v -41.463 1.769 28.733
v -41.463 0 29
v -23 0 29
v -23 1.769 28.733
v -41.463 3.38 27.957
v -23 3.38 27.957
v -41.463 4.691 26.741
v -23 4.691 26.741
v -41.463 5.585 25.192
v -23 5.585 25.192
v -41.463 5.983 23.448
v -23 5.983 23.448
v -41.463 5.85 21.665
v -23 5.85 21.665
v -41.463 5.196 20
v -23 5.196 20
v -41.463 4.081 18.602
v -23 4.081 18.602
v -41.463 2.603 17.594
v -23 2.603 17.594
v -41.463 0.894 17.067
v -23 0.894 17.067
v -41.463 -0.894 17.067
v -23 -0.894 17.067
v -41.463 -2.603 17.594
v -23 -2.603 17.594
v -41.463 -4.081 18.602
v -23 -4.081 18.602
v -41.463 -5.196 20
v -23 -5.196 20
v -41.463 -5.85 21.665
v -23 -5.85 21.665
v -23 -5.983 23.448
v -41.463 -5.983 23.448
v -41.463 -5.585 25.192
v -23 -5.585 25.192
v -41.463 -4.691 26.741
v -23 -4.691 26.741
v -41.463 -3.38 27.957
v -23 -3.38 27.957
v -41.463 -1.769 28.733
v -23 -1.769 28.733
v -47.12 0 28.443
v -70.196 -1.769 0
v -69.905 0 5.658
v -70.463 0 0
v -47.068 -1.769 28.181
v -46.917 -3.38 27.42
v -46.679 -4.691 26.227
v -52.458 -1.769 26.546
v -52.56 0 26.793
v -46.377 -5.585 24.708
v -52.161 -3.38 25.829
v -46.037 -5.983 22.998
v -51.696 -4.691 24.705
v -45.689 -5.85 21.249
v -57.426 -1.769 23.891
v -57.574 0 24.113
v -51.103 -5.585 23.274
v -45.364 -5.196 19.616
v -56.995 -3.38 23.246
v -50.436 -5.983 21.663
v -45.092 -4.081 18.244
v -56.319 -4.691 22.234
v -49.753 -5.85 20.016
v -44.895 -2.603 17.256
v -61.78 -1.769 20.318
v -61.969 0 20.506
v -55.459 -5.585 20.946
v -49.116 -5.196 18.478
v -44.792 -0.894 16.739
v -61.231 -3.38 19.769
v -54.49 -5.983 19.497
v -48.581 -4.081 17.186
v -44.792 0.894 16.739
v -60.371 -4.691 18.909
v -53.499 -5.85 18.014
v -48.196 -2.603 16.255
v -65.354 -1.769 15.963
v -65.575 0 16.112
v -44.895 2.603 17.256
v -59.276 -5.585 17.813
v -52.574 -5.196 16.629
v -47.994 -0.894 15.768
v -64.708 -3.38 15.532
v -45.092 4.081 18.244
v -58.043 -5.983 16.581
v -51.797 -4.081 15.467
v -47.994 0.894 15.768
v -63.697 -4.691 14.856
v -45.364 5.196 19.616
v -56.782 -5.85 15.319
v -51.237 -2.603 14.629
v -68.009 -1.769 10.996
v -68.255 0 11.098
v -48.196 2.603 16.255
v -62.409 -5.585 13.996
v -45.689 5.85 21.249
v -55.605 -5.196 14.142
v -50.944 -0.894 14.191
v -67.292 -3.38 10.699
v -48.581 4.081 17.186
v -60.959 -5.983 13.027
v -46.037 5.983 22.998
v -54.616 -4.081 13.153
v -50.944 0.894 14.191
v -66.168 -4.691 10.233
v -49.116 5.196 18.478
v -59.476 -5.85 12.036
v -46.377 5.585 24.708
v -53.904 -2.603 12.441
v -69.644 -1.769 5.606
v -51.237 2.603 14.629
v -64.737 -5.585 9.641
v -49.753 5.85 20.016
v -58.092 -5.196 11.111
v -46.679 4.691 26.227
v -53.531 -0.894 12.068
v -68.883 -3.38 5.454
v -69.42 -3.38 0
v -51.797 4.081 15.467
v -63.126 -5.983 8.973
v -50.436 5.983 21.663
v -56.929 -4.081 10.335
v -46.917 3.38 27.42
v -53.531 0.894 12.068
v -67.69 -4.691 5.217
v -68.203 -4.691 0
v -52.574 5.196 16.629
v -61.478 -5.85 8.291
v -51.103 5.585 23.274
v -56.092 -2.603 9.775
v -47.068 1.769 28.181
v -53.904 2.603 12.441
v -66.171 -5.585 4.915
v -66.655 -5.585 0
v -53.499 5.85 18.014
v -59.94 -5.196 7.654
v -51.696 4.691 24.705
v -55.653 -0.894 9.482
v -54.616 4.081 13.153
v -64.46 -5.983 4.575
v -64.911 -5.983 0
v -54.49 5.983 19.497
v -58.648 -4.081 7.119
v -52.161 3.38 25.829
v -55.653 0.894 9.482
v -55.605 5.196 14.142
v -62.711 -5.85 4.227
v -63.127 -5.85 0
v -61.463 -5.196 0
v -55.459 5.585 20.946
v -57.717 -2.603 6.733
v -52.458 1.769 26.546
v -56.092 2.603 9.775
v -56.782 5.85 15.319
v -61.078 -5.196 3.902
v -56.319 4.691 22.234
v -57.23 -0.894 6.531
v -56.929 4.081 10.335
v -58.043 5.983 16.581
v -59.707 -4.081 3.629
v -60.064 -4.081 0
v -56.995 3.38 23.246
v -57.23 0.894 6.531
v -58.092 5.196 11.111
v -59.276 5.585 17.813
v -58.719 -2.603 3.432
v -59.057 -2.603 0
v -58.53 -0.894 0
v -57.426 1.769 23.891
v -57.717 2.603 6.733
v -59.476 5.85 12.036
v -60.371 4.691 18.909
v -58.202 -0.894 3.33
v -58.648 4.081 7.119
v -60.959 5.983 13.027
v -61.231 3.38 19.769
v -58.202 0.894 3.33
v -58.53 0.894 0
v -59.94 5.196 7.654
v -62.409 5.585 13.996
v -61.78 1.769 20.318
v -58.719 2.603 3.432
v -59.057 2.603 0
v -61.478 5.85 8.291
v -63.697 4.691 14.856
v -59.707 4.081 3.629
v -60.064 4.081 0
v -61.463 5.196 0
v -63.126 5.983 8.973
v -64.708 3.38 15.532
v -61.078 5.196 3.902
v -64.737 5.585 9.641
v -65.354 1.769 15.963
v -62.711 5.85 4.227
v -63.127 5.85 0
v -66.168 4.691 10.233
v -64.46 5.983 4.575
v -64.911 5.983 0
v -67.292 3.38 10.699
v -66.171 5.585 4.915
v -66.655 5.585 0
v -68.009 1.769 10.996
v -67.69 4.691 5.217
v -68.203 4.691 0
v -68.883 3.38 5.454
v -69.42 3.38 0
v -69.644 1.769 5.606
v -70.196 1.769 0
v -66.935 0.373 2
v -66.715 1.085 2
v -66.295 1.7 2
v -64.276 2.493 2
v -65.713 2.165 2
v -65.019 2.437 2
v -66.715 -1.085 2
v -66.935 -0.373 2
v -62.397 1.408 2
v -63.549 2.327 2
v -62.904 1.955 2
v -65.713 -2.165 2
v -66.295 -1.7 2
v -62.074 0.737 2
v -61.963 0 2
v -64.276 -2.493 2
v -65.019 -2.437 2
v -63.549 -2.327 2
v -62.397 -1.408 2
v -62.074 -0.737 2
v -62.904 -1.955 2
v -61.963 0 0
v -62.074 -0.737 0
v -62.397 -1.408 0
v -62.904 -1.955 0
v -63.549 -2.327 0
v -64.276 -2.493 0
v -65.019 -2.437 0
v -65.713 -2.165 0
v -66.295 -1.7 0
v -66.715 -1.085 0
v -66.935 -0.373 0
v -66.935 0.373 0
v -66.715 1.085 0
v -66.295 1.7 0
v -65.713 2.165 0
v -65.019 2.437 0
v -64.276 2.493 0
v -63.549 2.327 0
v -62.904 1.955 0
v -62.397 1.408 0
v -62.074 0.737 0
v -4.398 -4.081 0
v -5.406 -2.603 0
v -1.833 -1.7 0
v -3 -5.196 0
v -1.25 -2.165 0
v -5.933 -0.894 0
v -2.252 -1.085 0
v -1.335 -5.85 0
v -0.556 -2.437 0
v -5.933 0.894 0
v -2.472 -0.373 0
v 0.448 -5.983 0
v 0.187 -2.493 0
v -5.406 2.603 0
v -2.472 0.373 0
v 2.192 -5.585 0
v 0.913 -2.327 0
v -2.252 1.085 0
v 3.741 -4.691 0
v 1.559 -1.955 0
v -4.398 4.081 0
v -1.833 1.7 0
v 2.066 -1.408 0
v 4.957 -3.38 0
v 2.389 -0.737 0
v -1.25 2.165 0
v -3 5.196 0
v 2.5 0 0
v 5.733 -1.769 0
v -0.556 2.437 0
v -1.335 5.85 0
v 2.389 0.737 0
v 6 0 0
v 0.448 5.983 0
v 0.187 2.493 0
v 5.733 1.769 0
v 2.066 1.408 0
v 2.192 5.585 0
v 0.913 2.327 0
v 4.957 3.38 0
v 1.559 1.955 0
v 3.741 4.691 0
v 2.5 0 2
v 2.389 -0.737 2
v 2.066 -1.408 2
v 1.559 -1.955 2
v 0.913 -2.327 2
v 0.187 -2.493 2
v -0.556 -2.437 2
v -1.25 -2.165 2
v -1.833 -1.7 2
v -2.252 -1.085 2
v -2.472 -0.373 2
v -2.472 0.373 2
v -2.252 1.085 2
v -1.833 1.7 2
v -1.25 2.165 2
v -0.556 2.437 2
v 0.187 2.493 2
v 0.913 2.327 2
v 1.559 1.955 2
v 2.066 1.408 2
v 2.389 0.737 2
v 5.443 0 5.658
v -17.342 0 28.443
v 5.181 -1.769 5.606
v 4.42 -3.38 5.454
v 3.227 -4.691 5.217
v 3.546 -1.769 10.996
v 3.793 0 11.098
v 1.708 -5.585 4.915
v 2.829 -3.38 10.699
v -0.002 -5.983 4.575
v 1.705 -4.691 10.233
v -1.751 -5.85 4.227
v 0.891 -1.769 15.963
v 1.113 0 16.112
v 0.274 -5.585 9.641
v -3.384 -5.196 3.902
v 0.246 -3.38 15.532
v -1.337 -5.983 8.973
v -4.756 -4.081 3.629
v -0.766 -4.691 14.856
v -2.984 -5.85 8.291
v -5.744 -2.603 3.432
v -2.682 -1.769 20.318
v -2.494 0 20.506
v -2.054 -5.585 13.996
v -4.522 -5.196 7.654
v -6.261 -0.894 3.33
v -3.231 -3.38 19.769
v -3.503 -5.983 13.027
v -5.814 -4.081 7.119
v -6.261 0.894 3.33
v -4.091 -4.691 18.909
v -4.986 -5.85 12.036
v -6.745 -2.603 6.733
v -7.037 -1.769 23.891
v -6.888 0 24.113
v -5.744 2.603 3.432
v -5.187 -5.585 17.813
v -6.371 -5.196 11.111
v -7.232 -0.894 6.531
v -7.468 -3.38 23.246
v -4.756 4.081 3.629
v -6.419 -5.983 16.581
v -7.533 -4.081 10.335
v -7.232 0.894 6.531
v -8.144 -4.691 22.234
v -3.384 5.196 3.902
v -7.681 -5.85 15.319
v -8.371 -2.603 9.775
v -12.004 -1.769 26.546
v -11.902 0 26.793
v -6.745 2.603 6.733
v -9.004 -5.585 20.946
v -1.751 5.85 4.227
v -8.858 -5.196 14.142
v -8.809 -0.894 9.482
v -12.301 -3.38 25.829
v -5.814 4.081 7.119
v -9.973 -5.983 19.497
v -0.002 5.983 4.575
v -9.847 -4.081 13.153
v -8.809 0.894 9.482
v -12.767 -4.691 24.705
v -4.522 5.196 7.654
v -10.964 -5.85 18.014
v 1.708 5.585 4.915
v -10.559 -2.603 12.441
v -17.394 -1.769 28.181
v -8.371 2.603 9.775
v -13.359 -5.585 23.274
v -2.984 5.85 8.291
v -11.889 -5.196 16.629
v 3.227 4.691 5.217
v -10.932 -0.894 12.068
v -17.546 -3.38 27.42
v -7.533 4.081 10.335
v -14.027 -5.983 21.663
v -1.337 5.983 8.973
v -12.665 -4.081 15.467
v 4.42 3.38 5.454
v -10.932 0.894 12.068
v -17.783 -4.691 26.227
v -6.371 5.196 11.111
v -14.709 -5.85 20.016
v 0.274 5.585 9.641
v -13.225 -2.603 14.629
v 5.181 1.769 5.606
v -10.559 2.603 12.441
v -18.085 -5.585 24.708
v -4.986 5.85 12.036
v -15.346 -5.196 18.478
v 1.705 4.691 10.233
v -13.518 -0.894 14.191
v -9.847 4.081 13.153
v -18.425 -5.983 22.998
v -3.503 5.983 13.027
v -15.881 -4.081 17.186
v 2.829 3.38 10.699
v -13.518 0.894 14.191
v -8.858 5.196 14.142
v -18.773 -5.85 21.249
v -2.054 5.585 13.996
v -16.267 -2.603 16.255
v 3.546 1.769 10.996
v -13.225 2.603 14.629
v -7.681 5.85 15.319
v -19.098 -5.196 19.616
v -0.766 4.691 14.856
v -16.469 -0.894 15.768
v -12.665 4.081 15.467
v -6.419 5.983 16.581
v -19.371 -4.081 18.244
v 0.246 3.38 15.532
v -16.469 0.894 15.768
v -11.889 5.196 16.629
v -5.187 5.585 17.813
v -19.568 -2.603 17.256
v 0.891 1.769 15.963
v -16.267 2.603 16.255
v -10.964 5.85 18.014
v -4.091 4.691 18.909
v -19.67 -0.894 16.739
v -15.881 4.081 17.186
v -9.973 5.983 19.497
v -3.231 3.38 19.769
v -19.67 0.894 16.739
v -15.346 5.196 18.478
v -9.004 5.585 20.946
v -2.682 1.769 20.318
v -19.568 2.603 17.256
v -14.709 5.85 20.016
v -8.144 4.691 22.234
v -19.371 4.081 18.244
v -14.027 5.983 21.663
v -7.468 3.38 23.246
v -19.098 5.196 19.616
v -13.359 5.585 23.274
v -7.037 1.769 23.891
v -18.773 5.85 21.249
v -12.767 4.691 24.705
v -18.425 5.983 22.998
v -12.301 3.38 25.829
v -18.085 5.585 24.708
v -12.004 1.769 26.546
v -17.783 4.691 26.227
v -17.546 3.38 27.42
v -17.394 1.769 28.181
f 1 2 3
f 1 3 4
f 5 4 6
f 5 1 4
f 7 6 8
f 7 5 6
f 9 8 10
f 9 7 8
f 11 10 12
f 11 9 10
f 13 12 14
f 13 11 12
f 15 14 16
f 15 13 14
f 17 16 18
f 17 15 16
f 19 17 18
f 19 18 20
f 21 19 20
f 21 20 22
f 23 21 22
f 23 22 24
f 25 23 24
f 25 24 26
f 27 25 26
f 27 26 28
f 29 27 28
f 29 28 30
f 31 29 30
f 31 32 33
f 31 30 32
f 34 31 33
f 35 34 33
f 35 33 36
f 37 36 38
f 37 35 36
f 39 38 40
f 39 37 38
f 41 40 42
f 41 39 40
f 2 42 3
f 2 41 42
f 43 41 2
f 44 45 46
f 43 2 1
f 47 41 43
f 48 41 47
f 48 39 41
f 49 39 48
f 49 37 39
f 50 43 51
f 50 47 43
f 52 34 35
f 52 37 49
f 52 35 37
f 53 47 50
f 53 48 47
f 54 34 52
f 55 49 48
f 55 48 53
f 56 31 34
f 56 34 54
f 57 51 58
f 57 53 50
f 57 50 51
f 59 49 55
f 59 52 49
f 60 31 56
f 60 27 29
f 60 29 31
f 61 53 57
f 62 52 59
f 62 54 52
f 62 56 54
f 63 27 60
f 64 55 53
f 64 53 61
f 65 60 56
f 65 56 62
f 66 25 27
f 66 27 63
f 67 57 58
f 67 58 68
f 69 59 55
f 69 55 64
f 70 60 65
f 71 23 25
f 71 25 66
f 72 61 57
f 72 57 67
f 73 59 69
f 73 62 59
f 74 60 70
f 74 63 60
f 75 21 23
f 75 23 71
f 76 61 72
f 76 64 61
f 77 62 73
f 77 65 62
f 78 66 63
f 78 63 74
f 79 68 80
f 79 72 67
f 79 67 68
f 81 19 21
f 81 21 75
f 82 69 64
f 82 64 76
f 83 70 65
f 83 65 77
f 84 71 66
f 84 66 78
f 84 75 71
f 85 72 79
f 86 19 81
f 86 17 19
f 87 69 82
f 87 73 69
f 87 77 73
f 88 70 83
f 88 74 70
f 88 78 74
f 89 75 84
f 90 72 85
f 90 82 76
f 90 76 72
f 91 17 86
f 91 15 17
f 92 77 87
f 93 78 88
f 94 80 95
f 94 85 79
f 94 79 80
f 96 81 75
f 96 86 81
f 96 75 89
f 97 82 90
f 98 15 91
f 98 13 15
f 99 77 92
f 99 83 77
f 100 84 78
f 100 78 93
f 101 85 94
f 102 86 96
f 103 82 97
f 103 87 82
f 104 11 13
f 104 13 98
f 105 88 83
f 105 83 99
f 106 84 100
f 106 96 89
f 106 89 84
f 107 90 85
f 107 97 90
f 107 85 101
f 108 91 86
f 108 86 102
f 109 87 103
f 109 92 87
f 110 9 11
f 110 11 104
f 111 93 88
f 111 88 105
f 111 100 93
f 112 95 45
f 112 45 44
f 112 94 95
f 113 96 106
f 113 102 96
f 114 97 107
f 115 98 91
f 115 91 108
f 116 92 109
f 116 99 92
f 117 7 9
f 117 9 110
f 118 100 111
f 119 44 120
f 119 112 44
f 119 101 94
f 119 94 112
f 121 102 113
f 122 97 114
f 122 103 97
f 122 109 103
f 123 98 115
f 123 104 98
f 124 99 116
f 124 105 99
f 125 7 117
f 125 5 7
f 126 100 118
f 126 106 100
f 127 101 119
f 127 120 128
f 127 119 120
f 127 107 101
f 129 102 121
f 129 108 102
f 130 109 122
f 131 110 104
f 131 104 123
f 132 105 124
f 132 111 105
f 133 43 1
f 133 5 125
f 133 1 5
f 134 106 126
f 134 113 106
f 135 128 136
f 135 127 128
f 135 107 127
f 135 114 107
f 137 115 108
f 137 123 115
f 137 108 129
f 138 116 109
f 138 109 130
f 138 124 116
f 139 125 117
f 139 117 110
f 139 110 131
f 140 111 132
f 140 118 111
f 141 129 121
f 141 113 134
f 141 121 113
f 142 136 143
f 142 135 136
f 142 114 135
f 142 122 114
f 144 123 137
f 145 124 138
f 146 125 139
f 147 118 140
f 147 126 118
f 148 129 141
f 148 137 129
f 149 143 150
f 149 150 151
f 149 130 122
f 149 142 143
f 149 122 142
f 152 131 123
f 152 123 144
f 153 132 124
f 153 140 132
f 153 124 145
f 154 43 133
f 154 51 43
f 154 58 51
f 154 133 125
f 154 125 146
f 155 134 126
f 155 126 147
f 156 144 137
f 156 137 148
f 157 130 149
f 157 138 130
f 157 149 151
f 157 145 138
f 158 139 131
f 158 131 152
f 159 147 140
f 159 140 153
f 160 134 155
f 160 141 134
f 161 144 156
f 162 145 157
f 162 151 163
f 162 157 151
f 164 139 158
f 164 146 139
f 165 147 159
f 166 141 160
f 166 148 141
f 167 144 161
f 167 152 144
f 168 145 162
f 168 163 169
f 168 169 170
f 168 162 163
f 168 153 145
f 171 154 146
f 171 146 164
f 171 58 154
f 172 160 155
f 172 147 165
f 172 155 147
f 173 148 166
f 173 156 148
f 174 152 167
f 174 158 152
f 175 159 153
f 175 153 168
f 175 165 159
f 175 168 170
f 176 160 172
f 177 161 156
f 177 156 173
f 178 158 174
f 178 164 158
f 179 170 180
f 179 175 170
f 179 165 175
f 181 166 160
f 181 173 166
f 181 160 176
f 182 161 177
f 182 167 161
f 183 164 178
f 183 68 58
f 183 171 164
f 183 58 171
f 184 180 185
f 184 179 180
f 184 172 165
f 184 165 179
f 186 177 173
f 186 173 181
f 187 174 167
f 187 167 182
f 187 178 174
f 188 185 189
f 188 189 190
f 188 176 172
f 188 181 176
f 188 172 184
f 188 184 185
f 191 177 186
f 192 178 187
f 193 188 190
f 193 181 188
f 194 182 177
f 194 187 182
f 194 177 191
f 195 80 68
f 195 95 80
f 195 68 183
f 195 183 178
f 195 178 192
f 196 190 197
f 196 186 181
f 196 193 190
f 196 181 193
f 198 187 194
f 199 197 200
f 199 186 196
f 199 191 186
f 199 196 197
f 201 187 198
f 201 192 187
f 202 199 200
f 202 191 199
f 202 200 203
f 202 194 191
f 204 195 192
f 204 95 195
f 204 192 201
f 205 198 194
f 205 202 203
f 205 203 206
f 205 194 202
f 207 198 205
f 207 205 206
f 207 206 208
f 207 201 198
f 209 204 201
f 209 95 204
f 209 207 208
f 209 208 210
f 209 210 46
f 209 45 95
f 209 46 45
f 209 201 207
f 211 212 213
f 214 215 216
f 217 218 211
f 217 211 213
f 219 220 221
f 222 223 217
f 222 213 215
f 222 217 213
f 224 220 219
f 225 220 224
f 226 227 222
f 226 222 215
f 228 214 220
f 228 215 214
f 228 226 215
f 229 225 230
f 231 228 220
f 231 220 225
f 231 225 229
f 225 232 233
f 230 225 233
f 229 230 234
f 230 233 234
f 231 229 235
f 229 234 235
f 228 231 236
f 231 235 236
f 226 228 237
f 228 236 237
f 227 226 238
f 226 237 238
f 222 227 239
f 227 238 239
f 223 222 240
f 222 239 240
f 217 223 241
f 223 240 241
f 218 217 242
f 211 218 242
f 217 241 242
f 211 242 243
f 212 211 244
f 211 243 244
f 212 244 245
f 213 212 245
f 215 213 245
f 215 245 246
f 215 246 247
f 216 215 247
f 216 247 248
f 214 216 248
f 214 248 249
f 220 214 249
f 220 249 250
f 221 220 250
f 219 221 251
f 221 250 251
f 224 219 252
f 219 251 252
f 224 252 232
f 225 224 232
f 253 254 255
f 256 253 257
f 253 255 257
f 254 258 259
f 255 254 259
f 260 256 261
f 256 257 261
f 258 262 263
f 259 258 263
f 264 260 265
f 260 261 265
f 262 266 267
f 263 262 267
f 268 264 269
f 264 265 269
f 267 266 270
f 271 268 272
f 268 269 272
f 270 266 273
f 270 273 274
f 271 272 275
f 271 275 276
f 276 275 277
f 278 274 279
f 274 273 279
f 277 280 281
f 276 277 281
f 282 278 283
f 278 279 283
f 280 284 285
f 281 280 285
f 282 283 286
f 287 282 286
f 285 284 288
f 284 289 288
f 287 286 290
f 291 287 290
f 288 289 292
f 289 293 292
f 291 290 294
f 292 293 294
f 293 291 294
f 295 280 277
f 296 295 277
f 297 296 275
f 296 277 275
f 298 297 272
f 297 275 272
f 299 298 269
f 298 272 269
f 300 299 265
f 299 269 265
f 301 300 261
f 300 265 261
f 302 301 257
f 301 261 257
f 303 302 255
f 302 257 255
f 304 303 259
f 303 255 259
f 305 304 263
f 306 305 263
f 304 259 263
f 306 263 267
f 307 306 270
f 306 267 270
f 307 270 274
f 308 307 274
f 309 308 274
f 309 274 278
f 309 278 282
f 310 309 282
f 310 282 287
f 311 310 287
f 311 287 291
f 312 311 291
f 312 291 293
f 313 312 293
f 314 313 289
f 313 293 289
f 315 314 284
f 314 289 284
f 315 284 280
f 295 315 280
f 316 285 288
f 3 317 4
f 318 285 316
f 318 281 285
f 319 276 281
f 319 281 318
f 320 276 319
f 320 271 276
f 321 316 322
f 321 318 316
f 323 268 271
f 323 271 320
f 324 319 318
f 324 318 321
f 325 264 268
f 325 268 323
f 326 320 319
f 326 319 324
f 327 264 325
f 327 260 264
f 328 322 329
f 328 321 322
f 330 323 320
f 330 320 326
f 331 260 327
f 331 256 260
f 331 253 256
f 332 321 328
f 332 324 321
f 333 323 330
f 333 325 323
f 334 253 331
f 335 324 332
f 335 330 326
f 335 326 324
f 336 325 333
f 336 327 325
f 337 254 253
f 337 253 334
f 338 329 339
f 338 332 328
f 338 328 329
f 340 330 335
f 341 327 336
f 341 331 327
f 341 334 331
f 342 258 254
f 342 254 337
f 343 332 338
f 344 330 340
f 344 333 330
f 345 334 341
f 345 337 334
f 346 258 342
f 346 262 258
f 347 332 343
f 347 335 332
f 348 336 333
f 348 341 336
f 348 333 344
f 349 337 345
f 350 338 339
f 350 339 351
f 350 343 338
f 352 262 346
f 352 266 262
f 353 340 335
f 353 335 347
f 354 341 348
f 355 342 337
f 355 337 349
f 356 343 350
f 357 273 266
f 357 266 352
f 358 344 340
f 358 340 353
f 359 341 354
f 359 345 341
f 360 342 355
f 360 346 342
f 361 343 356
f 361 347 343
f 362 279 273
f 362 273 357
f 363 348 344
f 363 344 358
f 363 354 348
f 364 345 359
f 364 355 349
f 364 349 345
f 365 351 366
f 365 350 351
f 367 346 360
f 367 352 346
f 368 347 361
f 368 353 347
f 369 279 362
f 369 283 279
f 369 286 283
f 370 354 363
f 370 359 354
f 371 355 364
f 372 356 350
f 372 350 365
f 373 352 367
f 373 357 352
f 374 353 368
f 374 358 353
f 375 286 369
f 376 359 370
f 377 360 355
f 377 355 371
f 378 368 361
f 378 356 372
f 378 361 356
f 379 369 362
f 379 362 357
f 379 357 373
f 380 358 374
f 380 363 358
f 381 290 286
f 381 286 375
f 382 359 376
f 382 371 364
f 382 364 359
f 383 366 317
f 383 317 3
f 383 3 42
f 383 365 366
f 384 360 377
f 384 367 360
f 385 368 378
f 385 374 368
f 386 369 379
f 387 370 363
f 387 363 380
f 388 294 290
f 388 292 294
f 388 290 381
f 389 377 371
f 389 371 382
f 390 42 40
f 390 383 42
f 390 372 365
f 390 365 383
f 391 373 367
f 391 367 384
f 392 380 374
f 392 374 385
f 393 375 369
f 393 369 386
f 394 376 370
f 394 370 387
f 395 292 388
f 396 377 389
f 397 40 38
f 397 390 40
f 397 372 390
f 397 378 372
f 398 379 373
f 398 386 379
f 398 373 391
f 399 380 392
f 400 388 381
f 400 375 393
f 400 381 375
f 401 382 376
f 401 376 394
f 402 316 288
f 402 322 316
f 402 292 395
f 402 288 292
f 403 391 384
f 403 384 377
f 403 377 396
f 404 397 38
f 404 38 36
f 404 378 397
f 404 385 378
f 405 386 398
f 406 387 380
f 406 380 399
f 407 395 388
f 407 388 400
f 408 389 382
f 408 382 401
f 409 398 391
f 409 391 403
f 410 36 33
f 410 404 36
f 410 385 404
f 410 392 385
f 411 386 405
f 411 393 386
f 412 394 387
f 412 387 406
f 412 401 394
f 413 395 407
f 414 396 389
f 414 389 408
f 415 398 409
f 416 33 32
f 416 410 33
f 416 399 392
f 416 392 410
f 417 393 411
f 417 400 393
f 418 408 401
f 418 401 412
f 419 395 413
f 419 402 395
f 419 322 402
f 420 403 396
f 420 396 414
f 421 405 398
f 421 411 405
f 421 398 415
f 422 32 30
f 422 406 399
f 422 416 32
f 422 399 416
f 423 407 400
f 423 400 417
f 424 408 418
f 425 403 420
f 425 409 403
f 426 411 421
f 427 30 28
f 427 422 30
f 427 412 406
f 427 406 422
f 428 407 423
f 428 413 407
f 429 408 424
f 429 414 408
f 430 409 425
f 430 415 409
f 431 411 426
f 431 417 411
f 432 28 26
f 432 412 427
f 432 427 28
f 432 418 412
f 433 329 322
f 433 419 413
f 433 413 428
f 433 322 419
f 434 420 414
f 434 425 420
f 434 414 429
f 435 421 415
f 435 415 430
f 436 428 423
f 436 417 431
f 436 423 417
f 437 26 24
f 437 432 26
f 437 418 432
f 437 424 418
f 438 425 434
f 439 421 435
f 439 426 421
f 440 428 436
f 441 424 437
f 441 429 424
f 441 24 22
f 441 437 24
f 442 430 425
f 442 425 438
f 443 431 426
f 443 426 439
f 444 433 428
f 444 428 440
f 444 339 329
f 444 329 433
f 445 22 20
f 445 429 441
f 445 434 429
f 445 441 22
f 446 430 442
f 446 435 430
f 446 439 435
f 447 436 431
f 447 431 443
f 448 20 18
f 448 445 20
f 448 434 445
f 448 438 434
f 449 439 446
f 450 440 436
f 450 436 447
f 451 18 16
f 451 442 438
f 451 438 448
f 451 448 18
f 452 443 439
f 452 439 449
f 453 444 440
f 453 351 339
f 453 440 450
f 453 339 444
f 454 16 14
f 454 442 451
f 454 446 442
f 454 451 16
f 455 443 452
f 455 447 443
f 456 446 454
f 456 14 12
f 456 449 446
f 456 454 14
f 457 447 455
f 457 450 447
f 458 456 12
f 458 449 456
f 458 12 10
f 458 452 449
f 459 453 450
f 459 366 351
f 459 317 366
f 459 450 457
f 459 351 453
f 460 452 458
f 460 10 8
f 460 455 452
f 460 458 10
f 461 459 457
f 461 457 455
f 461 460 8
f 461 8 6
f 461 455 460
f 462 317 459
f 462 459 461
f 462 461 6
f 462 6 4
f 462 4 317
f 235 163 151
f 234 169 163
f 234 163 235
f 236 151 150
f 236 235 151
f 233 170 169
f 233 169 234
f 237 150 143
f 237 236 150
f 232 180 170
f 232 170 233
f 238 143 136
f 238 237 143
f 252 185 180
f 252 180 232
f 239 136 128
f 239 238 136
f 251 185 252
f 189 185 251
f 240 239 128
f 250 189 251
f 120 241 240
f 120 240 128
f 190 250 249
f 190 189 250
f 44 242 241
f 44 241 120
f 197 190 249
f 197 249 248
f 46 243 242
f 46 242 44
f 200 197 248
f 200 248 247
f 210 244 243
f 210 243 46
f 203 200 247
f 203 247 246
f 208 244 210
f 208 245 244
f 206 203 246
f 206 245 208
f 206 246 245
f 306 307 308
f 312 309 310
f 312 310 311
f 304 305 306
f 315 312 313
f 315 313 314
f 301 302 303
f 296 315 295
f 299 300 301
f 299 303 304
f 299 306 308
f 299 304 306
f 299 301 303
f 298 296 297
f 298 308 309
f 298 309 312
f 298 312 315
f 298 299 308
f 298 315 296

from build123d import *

# Parameters (mm, degrees)
F0_R     = 6
F3_R     = 2.5
F4_DEPTH = 2
F5_DEPTH = 2


with BuildPart() as f2:
    # F2: sweep along a path in F1
    with BuildLine(Plane.XZ) as f2_path:
        ThreePointArc((6, 0), (-2.493903, 20.506097), (-23, 29))
        Line((-23, 29), (-32.231277, 29))
        Line((-32.231277, 29), (-41.462554, 29))
        ThreePointArc((-41.462554, 29), (-61.96865, 20.506097), (-70.462554, 0))
    # F0 (on Top) → F2 (sweep)
    with BuildSketch(Plane.XY):
        Circle(F0_R)
    sweep(path=f2_path.line)

    # F3 (on face) → F4 (cut)
    with BuildSketch(Plane(origin=(0, 0, 0), x_dir=(1, 0, 0), z_dir=(0, 0, -1))):
        with Locations((-64.462554, 0)):
            Circle(F3_R)
    extrude(amount=-F4_DEPTH, mode=Mode.SUBTRACT)

    # F3 (on face) → F5 (cut)
    with BuildSketch(Plane(origin=(0, 0, 0), x_dir=(1, 0, 0), z_dir=(0, 0, -1))):
        Circle(F3_R)
    extrude(amount=-F5_DEPTH, mode=Mode.SUBTRACT)


solid = f2.part
